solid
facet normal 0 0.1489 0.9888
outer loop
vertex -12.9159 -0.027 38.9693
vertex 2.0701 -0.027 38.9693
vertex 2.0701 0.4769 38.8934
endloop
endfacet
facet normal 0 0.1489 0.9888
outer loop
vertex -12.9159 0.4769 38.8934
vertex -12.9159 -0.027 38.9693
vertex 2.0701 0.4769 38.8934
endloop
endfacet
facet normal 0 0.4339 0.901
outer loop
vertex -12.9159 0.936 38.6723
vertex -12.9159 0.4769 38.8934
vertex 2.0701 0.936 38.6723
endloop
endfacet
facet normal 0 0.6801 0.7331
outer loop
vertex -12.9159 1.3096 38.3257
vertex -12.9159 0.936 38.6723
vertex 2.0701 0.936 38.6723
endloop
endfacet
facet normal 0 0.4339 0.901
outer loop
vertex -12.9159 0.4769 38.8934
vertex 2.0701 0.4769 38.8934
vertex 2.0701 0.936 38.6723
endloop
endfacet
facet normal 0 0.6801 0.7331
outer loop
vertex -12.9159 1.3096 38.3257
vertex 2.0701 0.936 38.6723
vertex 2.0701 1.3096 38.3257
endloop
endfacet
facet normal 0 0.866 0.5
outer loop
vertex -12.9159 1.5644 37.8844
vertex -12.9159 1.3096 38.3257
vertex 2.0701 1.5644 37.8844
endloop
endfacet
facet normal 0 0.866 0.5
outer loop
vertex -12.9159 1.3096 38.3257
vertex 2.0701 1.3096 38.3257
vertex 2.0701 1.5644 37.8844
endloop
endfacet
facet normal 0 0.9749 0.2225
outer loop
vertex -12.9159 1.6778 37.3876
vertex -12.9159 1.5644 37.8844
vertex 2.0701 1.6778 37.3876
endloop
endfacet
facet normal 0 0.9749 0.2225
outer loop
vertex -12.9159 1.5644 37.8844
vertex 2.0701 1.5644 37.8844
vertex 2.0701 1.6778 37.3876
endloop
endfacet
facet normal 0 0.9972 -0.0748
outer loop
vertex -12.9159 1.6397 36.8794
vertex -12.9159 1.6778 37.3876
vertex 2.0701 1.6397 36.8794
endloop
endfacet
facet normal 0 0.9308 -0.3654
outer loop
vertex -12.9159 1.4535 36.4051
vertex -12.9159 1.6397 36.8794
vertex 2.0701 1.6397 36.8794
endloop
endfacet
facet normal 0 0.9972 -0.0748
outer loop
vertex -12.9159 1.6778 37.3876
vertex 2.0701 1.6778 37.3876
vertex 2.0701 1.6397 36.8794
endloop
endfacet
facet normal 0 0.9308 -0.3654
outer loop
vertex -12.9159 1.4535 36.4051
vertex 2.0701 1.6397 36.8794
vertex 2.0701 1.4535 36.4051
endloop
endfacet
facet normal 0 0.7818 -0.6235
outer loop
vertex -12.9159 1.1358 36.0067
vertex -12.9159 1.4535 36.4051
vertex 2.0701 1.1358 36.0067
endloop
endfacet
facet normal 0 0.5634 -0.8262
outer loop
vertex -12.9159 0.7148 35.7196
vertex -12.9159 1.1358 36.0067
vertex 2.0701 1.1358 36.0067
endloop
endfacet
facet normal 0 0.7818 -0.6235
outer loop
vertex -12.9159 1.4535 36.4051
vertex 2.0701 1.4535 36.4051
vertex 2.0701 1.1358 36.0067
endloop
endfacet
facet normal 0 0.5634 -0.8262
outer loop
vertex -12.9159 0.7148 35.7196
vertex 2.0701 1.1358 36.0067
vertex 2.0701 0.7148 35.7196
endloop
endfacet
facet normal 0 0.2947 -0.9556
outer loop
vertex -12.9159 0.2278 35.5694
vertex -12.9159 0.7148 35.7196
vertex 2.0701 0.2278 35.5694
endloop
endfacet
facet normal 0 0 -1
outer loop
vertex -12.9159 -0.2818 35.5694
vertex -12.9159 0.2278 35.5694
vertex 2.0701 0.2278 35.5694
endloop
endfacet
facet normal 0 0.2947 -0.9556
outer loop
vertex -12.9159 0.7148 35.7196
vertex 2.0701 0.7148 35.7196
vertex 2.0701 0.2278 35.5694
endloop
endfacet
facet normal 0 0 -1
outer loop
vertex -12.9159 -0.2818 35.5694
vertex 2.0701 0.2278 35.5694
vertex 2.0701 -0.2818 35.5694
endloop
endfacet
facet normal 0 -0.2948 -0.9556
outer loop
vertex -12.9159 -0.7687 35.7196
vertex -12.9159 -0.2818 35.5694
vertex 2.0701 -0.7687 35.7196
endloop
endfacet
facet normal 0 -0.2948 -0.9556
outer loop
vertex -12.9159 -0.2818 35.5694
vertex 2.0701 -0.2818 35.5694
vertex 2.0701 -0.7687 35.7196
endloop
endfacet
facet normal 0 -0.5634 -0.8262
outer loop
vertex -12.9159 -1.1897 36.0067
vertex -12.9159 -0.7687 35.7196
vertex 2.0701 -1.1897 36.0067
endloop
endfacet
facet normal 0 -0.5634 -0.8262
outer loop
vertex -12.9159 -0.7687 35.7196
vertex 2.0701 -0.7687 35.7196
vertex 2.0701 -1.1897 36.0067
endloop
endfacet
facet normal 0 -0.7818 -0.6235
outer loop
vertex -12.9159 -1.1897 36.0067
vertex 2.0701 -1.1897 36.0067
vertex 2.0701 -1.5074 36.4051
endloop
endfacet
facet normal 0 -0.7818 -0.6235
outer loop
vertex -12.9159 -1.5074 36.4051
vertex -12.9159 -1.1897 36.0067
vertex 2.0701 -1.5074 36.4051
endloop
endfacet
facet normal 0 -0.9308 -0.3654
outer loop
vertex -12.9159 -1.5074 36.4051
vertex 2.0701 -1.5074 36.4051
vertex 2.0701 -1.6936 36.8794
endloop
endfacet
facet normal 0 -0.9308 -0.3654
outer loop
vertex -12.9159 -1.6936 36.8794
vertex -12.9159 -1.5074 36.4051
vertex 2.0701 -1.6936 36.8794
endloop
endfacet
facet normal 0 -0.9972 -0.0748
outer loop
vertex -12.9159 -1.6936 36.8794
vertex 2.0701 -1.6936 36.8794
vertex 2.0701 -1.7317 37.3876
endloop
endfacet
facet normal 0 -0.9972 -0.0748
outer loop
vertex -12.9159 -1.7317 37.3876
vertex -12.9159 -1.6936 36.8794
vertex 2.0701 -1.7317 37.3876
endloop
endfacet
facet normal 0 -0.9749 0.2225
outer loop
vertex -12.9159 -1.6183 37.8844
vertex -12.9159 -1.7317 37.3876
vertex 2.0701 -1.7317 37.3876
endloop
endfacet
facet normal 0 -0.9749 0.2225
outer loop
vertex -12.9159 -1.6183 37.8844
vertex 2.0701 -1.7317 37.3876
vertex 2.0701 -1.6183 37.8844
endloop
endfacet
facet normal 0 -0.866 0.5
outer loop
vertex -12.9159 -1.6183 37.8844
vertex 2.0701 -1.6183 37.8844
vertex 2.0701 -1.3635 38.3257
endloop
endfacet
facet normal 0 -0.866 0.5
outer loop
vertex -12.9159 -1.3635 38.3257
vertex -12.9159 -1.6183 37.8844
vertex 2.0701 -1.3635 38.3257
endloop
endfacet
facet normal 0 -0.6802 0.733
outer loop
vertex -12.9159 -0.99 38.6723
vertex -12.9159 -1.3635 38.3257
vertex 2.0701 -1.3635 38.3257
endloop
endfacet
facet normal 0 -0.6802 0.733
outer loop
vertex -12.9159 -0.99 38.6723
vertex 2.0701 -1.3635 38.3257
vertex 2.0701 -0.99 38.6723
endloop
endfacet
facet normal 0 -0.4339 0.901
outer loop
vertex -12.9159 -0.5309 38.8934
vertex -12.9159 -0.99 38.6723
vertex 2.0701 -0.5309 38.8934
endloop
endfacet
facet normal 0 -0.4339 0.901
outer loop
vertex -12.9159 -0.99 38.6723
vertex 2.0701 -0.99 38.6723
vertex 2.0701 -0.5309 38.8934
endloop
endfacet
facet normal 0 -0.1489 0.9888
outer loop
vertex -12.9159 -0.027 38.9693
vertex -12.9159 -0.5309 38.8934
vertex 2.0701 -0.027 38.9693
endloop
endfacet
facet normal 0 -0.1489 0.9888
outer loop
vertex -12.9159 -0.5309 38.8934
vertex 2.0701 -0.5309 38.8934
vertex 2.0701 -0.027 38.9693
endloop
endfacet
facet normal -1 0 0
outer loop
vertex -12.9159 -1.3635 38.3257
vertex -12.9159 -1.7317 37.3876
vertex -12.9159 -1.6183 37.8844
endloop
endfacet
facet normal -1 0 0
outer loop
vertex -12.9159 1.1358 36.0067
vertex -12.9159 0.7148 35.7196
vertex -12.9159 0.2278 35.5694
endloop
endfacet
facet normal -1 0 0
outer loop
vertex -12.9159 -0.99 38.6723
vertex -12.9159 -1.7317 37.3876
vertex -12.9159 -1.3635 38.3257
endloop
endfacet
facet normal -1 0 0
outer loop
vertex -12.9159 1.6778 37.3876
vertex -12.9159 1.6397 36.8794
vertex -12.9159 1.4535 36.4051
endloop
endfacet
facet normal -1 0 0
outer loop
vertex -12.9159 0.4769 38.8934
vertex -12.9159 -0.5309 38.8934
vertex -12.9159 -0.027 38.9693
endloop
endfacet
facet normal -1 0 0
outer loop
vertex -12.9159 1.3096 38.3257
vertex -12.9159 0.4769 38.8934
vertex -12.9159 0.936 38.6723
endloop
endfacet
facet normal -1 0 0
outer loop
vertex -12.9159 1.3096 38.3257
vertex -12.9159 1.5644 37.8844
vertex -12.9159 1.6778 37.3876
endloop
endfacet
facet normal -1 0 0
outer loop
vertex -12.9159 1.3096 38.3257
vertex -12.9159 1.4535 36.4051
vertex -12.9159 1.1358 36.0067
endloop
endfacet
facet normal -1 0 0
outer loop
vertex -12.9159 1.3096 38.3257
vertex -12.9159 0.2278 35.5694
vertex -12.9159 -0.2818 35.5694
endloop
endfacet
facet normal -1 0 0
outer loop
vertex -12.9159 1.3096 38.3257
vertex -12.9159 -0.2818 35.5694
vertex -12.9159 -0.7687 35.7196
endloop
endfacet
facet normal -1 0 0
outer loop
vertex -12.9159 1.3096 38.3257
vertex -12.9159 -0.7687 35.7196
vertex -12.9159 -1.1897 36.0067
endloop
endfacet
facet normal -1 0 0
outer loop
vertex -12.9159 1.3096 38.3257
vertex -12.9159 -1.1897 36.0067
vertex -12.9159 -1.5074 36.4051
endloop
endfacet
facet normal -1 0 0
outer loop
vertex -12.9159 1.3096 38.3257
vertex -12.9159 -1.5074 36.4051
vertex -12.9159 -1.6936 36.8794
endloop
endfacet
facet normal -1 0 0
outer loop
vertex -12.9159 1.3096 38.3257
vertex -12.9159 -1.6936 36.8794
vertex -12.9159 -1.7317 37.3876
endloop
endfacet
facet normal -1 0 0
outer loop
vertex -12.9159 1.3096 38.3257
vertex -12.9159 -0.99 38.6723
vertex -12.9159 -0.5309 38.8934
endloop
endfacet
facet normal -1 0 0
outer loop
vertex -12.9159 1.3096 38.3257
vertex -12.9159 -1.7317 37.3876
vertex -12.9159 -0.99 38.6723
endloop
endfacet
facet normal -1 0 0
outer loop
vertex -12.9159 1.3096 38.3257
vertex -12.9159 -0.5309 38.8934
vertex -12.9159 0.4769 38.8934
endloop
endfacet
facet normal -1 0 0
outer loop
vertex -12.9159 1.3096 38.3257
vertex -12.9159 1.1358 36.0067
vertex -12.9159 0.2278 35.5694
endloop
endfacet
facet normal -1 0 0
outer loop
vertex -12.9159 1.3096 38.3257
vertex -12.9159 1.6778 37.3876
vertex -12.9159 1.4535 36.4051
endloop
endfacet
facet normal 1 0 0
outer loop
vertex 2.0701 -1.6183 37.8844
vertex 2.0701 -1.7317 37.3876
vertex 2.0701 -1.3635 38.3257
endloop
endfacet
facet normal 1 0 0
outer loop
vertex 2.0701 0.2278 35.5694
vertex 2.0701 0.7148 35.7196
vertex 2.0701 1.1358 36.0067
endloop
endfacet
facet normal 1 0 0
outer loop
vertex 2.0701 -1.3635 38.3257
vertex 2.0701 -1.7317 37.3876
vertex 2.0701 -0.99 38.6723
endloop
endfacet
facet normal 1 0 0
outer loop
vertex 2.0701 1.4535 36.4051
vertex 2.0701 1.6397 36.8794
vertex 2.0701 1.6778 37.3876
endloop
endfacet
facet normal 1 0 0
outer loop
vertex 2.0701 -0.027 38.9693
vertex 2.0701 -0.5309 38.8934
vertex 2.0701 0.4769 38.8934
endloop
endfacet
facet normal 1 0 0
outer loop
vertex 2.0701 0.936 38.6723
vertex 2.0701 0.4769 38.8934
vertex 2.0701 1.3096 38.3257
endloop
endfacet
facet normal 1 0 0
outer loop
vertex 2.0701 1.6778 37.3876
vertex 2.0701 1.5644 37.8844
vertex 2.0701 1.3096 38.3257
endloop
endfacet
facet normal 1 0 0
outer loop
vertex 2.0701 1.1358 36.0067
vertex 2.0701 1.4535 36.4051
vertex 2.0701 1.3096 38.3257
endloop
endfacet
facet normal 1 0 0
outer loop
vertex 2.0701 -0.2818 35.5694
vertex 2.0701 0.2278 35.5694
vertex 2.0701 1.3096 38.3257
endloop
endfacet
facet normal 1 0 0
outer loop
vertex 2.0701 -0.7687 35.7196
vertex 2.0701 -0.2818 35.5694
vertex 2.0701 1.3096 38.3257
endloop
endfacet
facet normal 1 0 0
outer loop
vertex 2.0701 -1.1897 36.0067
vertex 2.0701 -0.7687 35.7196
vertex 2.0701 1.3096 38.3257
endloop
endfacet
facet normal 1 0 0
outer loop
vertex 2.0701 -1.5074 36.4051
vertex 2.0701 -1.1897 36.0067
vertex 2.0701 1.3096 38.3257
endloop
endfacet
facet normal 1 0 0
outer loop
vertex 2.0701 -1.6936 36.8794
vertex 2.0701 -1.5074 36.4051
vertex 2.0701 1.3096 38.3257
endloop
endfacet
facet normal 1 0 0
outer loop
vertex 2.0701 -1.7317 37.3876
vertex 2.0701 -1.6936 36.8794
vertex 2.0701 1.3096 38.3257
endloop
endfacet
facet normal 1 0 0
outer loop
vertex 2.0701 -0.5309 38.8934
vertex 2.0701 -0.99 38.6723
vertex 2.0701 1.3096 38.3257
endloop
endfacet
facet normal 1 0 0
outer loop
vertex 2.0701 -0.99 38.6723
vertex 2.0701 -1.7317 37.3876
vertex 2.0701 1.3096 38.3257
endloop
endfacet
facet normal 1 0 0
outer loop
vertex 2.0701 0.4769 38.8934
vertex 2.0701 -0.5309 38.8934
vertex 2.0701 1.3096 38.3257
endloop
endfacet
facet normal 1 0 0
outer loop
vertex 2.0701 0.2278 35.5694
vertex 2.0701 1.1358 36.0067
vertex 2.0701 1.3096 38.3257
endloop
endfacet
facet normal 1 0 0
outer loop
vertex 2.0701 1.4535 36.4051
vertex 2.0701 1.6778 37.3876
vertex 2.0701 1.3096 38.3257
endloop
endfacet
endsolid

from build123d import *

# Parameters (mm, degrees)
SURFACE_EXTRUDE4_START     = -1.778
SURFACE_EXTRUDE4_OUTLINE_R = 1.709503837
SURFACE_EXTRUDE4_DEPTH     = 14.986


# Read off the part's stored shape, not the designer's step: Surface-Extrude4
with BuildPart() as part:
    # Surface-Extrude4 outline → Surface-Extrude4 (new body)
    with BuildSketch(Plane.ZY.offset(-0.2921).offset(SURFACE_EXTRUDE4_START)):
        with Locations((37.259820513, -0.026967113)):
            Circle(SURFACE_EXTRUDE4_OUTLINE_R)
    extrude(amount=SURFACE_EXTRUDE4_DEPTH)


solid = part.part
